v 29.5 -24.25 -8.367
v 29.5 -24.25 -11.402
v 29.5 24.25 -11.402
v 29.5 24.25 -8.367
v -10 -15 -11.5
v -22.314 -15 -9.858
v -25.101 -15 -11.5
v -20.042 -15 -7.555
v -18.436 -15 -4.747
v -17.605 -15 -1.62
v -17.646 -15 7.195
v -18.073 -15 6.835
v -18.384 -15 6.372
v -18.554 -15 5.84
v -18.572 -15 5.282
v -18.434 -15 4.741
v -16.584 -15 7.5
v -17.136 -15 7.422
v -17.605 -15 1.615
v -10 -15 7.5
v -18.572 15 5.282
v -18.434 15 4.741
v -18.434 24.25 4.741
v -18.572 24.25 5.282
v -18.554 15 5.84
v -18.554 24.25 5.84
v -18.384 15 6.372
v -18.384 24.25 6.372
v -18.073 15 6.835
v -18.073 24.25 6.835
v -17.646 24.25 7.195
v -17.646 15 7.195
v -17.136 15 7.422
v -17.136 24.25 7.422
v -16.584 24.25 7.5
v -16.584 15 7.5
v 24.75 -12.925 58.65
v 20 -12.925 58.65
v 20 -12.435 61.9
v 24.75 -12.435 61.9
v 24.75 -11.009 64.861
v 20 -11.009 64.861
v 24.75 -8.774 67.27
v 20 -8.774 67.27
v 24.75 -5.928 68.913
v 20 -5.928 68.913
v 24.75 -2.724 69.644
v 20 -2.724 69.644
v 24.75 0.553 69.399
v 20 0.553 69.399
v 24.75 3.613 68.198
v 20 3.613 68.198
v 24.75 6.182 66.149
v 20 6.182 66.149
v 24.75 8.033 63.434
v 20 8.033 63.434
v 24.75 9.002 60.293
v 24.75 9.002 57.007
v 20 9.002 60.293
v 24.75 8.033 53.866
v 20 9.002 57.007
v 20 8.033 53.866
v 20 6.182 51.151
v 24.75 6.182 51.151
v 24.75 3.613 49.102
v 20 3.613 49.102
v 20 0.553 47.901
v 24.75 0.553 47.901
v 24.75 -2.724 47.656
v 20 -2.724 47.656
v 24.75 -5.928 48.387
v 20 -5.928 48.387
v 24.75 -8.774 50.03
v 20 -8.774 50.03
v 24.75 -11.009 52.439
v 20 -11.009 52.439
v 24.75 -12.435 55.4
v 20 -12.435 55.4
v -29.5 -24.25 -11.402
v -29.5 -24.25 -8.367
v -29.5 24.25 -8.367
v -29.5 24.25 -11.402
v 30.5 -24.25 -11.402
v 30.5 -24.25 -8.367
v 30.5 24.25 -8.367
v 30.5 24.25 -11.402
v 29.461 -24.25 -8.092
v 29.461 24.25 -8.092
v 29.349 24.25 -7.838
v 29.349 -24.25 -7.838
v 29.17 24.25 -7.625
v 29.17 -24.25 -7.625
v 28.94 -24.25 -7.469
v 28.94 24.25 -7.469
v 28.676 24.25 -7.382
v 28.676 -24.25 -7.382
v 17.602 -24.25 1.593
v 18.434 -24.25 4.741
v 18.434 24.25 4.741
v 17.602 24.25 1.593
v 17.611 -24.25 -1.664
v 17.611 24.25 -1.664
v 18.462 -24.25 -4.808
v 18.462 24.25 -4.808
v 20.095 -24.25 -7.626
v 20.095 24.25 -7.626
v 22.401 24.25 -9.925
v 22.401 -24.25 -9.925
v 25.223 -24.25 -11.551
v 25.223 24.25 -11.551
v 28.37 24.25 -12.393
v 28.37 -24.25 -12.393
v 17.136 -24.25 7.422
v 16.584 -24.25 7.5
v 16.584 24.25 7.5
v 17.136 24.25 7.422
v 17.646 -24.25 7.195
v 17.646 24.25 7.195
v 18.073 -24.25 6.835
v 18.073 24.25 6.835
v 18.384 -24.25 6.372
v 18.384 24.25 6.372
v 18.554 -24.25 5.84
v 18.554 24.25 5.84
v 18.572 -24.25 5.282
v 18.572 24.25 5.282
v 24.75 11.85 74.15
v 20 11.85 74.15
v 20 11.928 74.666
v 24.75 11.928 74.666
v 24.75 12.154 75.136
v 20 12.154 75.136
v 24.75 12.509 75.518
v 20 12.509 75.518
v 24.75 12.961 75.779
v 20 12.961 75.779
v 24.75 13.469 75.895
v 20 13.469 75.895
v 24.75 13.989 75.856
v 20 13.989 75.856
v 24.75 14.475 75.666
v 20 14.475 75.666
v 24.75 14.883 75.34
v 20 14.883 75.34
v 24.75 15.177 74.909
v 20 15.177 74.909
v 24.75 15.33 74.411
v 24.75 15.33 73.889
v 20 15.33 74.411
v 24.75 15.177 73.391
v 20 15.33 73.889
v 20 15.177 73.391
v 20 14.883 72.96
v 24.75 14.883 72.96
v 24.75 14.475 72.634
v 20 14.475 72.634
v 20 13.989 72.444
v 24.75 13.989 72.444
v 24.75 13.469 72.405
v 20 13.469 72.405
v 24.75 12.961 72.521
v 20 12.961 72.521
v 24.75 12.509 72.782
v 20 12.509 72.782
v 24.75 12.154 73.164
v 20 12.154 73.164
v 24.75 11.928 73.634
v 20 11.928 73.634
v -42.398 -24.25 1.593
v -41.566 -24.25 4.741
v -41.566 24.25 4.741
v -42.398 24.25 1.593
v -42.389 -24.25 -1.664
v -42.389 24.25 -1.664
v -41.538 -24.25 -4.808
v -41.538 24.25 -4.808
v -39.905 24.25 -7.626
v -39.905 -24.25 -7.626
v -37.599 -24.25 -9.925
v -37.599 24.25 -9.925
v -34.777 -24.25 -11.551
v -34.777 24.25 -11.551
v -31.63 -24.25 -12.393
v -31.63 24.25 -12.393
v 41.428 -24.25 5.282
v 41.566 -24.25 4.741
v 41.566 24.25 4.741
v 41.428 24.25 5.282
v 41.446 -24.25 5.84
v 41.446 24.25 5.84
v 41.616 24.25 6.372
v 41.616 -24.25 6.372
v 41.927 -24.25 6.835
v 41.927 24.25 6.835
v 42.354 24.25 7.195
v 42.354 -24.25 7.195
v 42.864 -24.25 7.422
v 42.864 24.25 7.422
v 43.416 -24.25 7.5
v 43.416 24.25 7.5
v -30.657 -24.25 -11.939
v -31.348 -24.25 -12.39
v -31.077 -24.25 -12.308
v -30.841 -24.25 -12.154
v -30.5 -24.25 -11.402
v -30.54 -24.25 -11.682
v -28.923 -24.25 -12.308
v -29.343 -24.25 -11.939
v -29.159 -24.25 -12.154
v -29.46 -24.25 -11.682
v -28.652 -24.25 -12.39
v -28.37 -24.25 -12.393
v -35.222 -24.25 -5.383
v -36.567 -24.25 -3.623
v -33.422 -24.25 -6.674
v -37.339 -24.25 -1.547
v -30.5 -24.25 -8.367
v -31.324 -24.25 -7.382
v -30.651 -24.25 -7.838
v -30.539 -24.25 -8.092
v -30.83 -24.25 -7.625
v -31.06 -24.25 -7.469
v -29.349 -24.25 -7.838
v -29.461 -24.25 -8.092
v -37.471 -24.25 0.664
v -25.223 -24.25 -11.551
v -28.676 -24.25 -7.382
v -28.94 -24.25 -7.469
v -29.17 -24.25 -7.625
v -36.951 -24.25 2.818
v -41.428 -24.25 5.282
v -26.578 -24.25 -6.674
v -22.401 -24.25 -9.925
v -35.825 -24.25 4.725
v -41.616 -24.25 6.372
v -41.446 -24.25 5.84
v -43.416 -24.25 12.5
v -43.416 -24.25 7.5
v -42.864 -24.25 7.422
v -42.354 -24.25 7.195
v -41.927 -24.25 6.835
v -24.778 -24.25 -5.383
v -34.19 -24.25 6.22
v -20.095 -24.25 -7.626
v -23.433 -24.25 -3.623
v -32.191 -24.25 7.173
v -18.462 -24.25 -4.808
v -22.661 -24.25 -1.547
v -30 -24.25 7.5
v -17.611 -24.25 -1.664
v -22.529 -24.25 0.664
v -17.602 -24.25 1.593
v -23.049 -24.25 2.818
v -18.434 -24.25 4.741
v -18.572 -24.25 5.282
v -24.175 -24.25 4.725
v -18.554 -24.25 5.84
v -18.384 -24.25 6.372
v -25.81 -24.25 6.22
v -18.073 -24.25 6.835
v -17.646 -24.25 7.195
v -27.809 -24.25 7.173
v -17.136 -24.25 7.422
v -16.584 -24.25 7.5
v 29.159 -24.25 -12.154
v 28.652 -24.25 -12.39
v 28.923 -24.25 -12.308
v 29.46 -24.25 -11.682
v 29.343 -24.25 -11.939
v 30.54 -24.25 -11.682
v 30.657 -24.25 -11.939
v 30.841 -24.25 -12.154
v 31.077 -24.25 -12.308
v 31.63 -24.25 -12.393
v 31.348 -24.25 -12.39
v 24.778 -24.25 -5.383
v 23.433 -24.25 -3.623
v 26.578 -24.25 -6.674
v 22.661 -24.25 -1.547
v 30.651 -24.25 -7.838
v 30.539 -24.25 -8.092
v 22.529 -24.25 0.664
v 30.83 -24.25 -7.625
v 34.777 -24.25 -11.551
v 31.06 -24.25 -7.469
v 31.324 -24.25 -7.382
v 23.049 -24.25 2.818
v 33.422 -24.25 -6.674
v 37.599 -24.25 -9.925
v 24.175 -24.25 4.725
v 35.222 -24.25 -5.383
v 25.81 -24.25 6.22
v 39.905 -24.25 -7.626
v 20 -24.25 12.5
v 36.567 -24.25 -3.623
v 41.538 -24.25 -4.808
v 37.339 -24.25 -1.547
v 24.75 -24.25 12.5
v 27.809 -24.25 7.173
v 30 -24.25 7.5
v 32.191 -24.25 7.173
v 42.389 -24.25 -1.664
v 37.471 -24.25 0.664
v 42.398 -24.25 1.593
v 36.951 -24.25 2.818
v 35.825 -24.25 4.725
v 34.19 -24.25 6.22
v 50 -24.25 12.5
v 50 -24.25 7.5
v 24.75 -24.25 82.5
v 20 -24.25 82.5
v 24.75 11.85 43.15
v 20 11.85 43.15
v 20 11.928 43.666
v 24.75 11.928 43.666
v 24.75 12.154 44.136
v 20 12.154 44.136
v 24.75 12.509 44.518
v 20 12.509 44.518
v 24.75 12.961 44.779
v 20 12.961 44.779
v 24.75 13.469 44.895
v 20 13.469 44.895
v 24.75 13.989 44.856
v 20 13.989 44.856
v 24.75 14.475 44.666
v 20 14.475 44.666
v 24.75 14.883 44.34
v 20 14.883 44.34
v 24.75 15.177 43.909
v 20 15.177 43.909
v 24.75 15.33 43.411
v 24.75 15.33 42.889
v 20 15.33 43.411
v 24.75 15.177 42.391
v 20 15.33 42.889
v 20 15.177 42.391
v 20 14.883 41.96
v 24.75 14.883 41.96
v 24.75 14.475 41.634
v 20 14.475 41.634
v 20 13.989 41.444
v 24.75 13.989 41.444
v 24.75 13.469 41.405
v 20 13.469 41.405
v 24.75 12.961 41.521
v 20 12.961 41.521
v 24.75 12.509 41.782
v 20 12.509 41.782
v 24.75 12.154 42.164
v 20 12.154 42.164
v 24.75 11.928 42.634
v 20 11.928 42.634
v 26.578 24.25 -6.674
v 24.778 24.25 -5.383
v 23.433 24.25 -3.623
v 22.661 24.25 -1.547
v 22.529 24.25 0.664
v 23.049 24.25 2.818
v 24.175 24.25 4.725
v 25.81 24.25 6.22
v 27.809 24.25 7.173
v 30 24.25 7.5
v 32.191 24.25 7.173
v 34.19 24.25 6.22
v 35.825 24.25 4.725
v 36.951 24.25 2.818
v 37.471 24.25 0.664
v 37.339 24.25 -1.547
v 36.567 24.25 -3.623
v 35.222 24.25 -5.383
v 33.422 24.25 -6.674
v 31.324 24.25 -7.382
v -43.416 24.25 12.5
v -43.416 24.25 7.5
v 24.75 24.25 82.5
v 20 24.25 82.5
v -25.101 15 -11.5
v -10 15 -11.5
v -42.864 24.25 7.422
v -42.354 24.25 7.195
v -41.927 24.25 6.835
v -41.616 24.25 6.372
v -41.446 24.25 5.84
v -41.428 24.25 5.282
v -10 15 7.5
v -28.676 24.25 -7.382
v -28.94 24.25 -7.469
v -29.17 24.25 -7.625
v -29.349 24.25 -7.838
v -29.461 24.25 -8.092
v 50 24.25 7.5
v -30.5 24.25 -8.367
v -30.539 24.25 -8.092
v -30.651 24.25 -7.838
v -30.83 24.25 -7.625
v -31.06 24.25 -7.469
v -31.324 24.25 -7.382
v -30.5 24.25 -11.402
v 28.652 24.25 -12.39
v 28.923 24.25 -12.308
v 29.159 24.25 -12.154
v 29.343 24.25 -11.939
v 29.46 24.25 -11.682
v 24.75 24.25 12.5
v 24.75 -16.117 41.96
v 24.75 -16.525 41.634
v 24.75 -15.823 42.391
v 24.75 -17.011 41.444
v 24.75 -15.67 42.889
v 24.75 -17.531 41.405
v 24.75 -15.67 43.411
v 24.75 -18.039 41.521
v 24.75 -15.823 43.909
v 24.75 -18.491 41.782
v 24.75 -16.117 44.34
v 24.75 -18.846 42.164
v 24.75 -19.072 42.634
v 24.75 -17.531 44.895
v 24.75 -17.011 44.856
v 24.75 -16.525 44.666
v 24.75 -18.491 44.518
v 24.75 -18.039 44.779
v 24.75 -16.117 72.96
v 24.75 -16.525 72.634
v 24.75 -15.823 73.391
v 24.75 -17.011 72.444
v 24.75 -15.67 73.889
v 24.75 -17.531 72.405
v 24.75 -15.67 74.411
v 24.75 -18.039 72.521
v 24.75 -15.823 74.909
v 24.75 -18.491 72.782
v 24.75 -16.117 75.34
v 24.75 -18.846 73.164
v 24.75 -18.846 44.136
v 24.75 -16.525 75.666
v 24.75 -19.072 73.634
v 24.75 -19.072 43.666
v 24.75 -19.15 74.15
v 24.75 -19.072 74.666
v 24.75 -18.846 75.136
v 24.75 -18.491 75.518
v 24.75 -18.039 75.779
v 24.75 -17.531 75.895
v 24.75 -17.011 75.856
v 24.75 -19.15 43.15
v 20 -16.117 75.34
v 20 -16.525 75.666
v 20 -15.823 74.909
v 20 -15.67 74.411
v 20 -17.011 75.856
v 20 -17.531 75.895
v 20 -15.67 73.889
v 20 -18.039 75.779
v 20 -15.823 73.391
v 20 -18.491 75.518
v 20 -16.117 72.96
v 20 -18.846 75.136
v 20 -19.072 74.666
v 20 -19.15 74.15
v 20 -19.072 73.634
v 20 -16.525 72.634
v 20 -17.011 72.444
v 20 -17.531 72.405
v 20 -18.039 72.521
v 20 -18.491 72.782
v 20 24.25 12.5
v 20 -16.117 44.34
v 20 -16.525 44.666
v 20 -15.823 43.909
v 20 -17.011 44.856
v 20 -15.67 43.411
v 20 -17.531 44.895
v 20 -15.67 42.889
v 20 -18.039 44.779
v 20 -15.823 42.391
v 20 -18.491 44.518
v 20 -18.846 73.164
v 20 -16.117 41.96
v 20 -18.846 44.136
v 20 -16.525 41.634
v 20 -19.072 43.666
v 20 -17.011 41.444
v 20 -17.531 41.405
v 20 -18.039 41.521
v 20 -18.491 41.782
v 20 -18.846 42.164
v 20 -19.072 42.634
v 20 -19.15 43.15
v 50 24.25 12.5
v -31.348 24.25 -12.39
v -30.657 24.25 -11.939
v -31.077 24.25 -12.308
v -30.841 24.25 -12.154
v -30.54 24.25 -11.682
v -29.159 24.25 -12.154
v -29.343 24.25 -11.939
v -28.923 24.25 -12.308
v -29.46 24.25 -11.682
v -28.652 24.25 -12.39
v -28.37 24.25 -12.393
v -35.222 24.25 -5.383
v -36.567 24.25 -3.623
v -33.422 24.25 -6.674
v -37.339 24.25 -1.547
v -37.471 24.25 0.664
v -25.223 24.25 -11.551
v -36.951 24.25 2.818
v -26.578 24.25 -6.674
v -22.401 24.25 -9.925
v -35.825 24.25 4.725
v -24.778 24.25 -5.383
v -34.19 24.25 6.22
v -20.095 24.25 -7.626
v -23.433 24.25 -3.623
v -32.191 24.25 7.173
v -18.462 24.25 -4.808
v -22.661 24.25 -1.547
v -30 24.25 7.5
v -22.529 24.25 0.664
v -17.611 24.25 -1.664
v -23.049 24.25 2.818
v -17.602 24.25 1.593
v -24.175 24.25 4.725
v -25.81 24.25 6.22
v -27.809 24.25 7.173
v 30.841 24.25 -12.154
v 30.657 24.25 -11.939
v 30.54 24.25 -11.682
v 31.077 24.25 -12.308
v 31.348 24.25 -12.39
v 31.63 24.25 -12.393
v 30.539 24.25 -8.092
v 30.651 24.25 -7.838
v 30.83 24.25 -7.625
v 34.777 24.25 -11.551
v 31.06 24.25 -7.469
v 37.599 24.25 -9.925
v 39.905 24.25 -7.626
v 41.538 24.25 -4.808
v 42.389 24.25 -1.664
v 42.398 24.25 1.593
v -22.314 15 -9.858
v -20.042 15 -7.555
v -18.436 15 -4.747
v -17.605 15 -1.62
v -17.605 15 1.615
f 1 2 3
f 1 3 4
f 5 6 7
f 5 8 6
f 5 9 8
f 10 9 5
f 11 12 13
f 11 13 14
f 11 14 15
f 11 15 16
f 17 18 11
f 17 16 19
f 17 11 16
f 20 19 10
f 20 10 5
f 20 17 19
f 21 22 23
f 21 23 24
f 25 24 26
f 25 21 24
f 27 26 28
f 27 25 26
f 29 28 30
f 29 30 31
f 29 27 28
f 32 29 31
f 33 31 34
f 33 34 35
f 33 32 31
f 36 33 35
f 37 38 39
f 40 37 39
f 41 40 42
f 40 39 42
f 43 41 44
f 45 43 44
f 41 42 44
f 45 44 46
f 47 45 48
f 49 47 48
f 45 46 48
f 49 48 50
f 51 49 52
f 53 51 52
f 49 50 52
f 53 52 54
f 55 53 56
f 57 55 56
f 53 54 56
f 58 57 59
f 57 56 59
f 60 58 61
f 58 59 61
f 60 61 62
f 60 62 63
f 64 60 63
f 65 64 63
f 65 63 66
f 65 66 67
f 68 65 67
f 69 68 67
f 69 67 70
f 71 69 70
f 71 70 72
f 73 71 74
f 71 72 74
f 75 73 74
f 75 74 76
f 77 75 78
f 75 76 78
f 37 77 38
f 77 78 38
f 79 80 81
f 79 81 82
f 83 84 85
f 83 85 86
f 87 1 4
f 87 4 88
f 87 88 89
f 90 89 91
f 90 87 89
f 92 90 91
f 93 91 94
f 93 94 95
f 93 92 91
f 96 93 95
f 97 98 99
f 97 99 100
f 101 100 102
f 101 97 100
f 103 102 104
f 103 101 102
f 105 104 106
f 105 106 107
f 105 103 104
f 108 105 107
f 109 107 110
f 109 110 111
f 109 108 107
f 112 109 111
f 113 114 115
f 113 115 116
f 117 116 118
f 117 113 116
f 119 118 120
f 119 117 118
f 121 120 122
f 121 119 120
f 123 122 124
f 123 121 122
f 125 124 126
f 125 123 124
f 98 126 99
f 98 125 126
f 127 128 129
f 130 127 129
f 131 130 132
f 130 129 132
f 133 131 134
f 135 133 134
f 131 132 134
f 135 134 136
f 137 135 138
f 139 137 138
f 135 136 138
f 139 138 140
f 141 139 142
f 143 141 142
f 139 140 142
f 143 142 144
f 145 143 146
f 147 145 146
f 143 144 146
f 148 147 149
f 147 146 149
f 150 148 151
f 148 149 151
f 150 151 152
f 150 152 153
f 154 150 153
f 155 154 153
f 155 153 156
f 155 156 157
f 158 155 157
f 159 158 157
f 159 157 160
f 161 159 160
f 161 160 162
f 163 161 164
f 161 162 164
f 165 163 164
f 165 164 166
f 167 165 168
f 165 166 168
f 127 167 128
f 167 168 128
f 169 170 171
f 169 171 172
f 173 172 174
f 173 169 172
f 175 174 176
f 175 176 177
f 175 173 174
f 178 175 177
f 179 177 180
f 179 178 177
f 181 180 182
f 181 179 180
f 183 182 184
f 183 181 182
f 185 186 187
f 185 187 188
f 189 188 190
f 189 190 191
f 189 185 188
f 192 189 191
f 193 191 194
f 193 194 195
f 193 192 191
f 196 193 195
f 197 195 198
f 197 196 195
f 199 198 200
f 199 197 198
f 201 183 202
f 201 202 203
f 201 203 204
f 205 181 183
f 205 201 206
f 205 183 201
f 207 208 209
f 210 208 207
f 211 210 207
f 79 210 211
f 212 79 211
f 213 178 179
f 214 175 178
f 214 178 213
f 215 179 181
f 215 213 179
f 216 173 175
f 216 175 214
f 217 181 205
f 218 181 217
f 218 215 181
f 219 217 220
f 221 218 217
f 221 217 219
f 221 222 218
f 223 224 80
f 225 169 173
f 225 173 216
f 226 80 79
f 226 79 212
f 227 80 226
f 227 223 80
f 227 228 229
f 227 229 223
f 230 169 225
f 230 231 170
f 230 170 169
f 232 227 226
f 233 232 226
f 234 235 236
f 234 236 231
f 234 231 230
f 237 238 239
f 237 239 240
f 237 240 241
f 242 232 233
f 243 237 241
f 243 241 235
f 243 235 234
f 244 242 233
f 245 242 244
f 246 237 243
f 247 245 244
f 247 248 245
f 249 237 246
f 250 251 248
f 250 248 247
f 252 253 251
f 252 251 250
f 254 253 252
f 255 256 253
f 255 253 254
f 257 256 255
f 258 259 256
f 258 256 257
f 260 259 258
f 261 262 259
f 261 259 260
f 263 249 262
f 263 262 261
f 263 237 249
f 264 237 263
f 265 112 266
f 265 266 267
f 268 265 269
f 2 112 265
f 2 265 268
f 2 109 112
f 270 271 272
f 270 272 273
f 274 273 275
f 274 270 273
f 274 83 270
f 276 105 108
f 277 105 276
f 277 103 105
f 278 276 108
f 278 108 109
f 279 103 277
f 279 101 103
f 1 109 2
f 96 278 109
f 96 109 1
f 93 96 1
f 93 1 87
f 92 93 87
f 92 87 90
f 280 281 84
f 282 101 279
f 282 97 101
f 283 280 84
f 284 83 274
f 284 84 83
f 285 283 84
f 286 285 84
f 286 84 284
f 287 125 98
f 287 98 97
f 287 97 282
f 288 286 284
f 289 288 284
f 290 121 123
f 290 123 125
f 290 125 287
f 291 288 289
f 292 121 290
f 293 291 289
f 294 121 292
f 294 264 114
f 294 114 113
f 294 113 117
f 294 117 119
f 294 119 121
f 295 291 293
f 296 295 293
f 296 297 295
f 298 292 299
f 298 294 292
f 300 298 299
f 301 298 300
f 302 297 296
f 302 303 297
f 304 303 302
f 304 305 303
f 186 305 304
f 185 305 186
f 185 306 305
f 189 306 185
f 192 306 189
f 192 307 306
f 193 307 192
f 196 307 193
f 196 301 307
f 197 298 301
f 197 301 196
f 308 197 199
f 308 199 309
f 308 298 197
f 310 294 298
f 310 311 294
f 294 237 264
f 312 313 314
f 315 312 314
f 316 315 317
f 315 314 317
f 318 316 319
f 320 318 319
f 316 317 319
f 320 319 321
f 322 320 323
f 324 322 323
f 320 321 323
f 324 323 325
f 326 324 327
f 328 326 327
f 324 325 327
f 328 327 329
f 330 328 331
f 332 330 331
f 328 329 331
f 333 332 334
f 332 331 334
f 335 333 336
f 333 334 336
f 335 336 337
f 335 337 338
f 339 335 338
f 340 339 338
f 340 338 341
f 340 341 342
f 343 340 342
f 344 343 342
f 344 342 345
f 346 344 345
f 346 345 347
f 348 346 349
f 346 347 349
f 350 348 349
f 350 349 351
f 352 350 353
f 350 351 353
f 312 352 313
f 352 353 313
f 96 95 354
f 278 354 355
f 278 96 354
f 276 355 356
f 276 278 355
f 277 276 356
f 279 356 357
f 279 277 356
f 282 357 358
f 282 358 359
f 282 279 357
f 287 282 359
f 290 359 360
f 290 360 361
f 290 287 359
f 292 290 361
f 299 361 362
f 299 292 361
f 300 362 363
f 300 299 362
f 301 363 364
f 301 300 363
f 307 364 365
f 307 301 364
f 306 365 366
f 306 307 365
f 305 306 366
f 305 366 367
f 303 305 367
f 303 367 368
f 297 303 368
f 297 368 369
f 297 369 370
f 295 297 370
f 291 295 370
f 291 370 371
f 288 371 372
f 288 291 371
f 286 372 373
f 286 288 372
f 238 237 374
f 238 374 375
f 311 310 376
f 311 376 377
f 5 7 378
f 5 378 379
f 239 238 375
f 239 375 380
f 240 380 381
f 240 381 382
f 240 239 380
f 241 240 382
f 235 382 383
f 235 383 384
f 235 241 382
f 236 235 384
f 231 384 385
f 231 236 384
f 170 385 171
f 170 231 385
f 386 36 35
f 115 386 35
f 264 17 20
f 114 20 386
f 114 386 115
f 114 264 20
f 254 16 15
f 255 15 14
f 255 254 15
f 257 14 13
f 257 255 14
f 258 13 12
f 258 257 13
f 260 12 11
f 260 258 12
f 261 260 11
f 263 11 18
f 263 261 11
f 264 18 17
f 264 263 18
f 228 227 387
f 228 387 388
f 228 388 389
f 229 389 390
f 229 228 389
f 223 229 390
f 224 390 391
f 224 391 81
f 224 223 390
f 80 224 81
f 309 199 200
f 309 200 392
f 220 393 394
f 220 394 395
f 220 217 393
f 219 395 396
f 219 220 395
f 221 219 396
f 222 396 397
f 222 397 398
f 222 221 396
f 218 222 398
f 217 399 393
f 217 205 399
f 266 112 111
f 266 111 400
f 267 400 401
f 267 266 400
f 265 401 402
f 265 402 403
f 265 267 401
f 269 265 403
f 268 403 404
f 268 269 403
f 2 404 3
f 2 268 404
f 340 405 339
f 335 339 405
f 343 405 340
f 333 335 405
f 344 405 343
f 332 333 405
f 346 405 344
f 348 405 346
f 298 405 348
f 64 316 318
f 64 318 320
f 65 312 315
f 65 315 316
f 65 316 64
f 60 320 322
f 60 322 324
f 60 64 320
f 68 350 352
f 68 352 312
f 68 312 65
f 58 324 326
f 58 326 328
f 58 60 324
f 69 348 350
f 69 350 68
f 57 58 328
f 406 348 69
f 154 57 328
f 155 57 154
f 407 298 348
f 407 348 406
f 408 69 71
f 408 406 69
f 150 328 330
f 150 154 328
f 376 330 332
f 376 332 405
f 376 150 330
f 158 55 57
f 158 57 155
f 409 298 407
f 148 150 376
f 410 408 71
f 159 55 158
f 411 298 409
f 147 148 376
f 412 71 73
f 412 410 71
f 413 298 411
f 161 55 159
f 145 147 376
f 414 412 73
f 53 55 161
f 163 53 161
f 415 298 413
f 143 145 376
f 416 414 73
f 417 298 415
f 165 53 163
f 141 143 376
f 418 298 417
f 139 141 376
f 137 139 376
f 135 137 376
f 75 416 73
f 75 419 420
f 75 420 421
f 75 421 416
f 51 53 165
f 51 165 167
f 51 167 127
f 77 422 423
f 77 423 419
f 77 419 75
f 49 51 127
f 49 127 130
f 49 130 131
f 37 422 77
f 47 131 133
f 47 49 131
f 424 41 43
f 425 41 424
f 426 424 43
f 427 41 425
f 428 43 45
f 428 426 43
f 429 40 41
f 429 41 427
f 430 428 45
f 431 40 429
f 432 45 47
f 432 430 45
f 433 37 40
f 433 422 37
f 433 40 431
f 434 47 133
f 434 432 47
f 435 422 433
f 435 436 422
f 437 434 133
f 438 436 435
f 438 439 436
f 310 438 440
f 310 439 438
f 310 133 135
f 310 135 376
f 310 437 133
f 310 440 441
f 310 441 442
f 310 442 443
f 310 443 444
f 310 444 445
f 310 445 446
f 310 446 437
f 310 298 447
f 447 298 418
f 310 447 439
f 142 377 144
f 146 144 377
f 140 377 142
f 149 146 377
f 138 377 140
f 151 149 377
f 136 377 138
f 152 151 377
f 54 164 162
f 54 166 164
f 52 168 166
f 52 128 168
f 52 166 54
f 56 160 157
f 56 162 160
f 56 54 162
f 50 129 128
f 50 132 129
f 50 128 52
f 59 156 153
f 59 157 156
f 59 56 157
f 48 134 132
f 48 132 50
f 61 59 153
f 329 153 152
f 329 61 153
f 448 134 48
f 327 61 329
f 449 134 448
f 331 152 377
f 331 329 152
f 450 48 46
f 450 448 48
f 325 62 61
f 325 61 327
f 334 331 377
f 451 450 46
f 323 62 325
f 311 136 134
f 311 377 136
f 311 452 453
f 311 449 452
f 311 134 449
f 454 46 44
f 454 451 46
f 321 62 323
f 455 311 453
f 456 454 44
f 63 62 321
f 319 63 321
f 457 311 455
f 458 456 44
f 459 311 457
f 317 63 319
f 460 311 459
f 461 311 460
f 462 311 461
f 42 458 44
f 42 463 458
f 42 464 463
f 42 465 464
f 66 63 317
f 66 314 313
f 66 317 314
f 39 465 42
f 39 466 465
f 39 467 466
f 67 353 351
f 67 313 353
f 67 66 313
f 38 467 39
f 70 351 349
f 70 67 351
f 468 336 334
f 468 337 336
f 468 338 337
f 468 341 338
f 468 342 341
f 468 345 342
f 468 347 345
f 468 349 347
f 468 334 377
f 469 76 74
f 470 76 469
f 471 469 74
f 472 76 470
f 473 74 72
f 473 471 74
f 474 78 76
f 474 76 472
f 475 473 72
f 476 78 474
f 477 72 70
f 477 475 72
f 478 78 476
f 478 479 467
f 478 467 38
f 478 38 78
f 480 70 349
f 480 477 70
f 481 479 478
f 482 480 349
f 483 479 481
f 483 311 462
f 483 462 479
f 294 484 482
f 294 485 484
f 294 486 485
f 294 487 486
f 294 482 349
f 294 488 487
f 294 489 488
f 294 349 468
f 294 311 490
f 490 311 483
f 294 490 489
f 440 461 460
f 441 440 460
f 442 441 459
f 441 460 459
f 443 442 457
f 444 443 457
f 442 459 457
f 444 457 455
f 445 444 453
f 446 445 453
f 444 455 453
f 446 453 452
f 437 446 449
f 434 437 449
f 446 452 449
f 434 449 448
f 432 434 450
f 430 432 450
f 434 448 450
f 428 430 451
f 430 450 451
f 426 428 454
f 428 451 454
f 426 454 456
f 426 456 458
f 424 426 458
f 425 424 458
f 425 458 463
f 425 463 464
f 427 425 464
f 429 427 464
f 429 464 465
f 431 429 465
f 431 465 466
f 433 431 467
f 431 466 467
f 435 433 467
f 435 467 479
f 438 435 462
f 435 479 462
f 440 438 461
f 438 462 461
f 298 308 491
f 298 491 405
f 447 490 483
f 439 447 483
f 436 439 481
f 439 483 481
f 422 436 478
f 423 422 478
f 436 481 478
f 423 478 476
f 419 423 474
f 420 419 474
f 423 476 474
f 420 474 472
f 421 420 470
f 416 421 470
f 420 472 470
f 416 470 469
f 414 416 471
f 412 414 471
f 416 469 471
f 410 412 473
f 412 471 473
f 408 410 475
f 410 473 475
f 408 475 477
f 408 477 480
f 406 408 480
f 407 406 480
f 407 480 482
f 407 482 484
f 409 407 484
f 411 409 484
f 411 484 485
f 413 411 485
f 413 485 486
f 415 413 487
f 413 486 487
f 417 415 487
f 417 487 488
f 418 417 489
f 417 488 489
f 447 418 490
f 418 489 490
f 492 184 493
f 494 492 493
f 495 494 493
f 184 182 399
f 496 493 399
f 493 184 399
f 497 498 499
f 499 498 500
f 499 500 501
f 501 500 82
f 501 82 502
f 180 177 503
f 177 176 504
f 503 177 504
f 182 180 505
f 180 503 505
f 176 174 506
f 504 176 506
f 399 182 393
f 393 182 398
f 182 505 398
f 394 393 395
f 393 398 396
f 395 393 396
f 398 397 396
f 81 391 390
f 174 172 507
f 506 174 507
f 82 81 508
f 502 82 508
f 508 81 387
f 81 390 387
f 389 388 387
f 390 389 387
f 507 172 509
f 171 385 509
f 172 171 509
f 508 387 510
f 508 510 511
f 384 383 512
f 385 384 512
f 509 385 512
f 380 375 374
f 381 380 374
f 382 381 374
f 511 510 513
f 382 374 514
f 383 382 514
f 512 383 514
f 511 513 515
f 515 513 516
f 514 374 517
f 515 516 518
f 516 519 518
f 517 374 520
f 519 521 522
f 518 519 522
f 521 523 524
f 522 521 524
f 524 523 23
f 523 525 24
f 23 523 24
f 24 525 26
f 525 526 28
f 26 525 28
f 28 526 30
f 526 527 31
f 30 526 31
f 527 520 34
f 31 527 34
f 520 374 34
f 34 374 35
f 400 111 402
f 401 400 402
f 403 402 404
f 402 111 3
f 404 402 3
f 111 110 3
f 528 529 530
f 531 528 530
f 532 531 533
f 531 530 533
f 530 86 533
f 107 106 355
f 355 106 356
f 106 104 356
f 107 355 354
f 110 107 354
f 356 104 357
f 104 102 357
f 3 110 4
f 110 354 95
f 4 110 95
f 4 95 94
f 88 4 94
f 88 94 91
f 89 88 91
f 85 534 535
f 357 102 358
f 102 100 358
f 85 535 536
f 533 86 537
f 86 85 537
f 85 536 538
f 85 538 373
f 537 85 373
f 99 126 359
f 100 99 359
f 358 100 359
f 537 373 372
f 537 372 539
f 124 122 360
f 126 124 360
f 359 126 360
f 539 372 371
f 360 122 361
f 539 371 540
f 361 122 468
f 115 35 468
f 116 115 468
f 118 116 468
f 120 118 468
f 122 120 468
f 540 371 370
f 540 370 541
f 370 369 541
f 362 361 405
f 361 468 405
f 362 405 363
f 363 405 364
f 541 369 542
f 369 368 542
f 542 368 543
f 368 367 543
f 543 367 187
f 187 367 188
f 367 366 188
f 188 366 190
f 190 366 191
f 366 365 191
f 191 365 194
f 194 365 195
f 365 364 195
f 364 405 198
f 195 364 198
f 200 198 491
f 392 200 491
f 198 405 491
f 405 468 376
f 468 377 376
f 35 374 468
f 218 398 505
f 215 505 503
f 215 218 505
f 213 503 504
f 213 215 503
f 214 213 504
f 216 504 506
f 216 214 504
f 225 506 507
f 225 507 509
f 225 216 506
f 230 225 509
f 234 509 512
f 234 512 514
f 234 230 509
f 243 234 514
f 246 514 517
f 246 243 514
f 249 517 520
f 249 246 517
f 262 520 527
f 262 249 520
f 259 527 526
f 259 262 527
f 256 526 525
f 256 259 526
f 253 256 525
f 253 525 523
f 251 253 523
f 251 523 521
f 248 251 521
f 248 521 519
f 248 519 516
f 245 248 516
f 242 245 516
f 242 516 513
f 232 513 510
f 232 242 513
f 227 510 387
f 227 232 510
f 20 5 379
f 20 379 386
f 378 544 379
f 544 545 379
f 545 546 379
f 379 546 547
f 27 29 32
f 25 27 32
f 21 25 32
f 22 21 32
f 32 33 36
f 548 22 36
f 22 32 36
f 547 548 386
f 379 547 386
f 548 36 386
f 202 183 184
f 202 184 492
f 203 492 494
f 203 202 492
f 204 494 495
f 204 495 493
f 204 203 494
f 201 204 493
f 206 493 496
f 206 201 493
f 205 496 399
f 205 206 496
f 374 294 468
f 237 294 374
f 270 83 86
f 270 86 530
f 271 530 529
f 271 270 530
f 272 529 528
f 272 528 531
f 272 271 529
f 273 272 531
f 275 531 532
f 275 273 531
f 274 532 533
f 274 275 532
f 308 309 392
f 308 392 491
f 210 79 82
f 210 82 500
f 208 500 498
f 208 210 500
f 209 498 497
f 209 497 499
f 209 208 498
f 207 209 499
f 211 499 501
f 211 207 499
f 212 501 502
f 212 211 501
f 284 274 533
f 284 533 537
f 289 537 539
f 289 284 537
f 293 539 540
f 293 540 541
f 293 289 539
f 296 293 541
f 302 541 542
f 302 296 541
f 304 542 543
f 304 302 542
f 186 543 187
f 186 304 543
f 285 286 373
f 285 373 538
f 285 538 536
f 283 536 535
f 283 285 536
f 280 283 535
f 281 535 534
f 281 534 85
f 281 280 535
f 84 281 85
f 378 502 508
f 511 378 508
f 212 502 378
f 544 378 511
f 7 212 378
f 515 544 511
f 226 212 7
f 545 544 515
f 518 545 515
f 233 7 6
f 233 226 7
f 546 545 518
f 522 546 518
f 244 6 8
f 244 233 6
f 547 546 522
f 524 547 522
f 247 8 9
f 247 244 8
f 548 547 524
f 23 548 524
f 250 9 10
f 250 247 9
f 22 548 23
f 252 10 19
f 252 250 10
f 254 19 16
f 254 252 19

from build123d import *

# Parameters (mm, degrees)
F2_DEPTH      = 24.25
F2_DEPTH_BACK = 24.25
F3_R          = 11.025
F3_R_2        = 1.75
F4_DEPTH      = 4.75
F6_DEPTH      = 15
F6_DEPTH_BACK = 15


with BuildPart() as f2:
    # F1 (on Front) → F2 (new body, two sides)
    with BuildSketch(Plane.XZ) as f2_sk:
        with BuildLine():
            ThreePointArc((-31.323529, -7.382294), (-30, 7.5), (-28.676471, -7.382294))
            ThreePointArc((-28.676471, -7.382294), (-29.266965, -7.724911), (-29.5, -8.3666))
            Line((-29.5, -8.3666), (-29.5, -11.401754))
            ThreePointArc((-29.5, -11.401754), (-29.15938, -12.153564), (-28.369565, -12.393211))
            ThreePointArc((-28.369565, -12.393211), (-19.18639, -6.270235), (-18.434131, 4.741379))
            ThreePointArc((-18.434131, 4.741379), (-18.244502, 6.614172), (-16.583592, 7.5))
            Line((-16.583592, 7.5), (16.583592, 7.5))
            ThreePointArc((16.583592, 7.5), (18.244502, 6.614172), (18.434131, 4.741379))
            ThreePointArc((18.434131, 4.741379), (19.18639, -6.270235), (28.369565, -12.393211))
            ThreePointArc((28.369565, -12.393211), (29.15938, -12.153564), (29.5, -11.401754))
            Line((29.5, -11.401754), (29.5, -8.3666))
            ThreePointArc((29.5, -8.3666), (29.266965, -7.724911), (28.676471, -7.382294))
            ThreePointArc((28.676471, -7.382294), (30, 7.5), (31.323529, -7.382294))
            ThreePointArc((31.323529, -7.382294), (30.733035, -7.724911), (30.5, -8.3666))
            Line((30.5, -8.3666), (30.5, -11.401754))
            ThreePointArc((30.5, -11.401754), (30.84062, -12.153564), (31.630435, -12.393211))
            ThreePointArc((31.630435, -12.393211), (40.81361, -6.270235), (41.565869, 4.741379))
            ThreePointArc((41.565869, 4.741379), (41.755498, 6.614172), (43.416408, 7.5))
            Line((43.416408, 7.5), (50, 7.5))
            Line((50, 7.5), (50, 12.5))
            Line((50, 12.5), (24.75, 12.5))
            Line((24.75, 12.5), (24.75, 82.5))
            Line((24.75, 82.5), (20, 82.5))
            Line((20, 82.5), (20, 12.5))
            Line((20, 12.5), (-43.416408, 12.5))
            Line((-43.416408, 12.5), (-43.416408, 7.5))
            ThreePointArc((-43.416408, 7.5), (-41.755498, 6.614172), (-41.565869, 4.741379))
            ThreePointArc((-41.565869, 4.741379), (-40.81361, -6.270235), (-31.630435, -12.393211))
            ThreePointArc((-31.630435, -12.393211), (-30.84062, -12.153564), (-30.5, -11.401754))
            Line((-30.5, -11.401754), (-30.5, -8.3666))
            ThreePointArc((-30.5, -8.3666), (-30.733035, -7.724911), (-31.323529, -7.382294))
        make_face()
    extrude(amount=F2_DEPTH)
    extrude(f2_sk.sketch, amount=-F2_DEPTH_BACK)

    # F3 (on face) → F4 (cut, through all)
    with BuildSketch(Plane(origin=(20, 0, 0), x_dir=(0, -1, 0), z_dir=(-1, 0, 0))):
        with Locations((1.9, 58.65)):
            Circle(F3_R)
        with Locations((-13.6, 43.15)):
            Circle(F3_R_2)
        with Locations((17.4, 43.15)):
            Circle(F3_R_2)
        with Locations((17.4, 74.15)):
            Circle(F3_R_2)
        with Locations((-13.6, 74.15)):
            Circle(F3_R_2)
    extrude(amount=-F4_DEPTH, mode=Mode.SUBTRACT)

    # F5 (on Front) → F6 (join, two sides)
    with BuildSketch(Plane.XZ) as f6_sk:
        Polygon((-10, -11.5), (-10, 9.493519), (-19.701663, 9.493519), (-19.701663, 0), (-27.352255, -11.5), align=None)
    extrude(amount=F6_DEPTH)
    extrude(f6_sk.sketch, amount=-F6_DEPTH_BACK)


solid = f2.part
